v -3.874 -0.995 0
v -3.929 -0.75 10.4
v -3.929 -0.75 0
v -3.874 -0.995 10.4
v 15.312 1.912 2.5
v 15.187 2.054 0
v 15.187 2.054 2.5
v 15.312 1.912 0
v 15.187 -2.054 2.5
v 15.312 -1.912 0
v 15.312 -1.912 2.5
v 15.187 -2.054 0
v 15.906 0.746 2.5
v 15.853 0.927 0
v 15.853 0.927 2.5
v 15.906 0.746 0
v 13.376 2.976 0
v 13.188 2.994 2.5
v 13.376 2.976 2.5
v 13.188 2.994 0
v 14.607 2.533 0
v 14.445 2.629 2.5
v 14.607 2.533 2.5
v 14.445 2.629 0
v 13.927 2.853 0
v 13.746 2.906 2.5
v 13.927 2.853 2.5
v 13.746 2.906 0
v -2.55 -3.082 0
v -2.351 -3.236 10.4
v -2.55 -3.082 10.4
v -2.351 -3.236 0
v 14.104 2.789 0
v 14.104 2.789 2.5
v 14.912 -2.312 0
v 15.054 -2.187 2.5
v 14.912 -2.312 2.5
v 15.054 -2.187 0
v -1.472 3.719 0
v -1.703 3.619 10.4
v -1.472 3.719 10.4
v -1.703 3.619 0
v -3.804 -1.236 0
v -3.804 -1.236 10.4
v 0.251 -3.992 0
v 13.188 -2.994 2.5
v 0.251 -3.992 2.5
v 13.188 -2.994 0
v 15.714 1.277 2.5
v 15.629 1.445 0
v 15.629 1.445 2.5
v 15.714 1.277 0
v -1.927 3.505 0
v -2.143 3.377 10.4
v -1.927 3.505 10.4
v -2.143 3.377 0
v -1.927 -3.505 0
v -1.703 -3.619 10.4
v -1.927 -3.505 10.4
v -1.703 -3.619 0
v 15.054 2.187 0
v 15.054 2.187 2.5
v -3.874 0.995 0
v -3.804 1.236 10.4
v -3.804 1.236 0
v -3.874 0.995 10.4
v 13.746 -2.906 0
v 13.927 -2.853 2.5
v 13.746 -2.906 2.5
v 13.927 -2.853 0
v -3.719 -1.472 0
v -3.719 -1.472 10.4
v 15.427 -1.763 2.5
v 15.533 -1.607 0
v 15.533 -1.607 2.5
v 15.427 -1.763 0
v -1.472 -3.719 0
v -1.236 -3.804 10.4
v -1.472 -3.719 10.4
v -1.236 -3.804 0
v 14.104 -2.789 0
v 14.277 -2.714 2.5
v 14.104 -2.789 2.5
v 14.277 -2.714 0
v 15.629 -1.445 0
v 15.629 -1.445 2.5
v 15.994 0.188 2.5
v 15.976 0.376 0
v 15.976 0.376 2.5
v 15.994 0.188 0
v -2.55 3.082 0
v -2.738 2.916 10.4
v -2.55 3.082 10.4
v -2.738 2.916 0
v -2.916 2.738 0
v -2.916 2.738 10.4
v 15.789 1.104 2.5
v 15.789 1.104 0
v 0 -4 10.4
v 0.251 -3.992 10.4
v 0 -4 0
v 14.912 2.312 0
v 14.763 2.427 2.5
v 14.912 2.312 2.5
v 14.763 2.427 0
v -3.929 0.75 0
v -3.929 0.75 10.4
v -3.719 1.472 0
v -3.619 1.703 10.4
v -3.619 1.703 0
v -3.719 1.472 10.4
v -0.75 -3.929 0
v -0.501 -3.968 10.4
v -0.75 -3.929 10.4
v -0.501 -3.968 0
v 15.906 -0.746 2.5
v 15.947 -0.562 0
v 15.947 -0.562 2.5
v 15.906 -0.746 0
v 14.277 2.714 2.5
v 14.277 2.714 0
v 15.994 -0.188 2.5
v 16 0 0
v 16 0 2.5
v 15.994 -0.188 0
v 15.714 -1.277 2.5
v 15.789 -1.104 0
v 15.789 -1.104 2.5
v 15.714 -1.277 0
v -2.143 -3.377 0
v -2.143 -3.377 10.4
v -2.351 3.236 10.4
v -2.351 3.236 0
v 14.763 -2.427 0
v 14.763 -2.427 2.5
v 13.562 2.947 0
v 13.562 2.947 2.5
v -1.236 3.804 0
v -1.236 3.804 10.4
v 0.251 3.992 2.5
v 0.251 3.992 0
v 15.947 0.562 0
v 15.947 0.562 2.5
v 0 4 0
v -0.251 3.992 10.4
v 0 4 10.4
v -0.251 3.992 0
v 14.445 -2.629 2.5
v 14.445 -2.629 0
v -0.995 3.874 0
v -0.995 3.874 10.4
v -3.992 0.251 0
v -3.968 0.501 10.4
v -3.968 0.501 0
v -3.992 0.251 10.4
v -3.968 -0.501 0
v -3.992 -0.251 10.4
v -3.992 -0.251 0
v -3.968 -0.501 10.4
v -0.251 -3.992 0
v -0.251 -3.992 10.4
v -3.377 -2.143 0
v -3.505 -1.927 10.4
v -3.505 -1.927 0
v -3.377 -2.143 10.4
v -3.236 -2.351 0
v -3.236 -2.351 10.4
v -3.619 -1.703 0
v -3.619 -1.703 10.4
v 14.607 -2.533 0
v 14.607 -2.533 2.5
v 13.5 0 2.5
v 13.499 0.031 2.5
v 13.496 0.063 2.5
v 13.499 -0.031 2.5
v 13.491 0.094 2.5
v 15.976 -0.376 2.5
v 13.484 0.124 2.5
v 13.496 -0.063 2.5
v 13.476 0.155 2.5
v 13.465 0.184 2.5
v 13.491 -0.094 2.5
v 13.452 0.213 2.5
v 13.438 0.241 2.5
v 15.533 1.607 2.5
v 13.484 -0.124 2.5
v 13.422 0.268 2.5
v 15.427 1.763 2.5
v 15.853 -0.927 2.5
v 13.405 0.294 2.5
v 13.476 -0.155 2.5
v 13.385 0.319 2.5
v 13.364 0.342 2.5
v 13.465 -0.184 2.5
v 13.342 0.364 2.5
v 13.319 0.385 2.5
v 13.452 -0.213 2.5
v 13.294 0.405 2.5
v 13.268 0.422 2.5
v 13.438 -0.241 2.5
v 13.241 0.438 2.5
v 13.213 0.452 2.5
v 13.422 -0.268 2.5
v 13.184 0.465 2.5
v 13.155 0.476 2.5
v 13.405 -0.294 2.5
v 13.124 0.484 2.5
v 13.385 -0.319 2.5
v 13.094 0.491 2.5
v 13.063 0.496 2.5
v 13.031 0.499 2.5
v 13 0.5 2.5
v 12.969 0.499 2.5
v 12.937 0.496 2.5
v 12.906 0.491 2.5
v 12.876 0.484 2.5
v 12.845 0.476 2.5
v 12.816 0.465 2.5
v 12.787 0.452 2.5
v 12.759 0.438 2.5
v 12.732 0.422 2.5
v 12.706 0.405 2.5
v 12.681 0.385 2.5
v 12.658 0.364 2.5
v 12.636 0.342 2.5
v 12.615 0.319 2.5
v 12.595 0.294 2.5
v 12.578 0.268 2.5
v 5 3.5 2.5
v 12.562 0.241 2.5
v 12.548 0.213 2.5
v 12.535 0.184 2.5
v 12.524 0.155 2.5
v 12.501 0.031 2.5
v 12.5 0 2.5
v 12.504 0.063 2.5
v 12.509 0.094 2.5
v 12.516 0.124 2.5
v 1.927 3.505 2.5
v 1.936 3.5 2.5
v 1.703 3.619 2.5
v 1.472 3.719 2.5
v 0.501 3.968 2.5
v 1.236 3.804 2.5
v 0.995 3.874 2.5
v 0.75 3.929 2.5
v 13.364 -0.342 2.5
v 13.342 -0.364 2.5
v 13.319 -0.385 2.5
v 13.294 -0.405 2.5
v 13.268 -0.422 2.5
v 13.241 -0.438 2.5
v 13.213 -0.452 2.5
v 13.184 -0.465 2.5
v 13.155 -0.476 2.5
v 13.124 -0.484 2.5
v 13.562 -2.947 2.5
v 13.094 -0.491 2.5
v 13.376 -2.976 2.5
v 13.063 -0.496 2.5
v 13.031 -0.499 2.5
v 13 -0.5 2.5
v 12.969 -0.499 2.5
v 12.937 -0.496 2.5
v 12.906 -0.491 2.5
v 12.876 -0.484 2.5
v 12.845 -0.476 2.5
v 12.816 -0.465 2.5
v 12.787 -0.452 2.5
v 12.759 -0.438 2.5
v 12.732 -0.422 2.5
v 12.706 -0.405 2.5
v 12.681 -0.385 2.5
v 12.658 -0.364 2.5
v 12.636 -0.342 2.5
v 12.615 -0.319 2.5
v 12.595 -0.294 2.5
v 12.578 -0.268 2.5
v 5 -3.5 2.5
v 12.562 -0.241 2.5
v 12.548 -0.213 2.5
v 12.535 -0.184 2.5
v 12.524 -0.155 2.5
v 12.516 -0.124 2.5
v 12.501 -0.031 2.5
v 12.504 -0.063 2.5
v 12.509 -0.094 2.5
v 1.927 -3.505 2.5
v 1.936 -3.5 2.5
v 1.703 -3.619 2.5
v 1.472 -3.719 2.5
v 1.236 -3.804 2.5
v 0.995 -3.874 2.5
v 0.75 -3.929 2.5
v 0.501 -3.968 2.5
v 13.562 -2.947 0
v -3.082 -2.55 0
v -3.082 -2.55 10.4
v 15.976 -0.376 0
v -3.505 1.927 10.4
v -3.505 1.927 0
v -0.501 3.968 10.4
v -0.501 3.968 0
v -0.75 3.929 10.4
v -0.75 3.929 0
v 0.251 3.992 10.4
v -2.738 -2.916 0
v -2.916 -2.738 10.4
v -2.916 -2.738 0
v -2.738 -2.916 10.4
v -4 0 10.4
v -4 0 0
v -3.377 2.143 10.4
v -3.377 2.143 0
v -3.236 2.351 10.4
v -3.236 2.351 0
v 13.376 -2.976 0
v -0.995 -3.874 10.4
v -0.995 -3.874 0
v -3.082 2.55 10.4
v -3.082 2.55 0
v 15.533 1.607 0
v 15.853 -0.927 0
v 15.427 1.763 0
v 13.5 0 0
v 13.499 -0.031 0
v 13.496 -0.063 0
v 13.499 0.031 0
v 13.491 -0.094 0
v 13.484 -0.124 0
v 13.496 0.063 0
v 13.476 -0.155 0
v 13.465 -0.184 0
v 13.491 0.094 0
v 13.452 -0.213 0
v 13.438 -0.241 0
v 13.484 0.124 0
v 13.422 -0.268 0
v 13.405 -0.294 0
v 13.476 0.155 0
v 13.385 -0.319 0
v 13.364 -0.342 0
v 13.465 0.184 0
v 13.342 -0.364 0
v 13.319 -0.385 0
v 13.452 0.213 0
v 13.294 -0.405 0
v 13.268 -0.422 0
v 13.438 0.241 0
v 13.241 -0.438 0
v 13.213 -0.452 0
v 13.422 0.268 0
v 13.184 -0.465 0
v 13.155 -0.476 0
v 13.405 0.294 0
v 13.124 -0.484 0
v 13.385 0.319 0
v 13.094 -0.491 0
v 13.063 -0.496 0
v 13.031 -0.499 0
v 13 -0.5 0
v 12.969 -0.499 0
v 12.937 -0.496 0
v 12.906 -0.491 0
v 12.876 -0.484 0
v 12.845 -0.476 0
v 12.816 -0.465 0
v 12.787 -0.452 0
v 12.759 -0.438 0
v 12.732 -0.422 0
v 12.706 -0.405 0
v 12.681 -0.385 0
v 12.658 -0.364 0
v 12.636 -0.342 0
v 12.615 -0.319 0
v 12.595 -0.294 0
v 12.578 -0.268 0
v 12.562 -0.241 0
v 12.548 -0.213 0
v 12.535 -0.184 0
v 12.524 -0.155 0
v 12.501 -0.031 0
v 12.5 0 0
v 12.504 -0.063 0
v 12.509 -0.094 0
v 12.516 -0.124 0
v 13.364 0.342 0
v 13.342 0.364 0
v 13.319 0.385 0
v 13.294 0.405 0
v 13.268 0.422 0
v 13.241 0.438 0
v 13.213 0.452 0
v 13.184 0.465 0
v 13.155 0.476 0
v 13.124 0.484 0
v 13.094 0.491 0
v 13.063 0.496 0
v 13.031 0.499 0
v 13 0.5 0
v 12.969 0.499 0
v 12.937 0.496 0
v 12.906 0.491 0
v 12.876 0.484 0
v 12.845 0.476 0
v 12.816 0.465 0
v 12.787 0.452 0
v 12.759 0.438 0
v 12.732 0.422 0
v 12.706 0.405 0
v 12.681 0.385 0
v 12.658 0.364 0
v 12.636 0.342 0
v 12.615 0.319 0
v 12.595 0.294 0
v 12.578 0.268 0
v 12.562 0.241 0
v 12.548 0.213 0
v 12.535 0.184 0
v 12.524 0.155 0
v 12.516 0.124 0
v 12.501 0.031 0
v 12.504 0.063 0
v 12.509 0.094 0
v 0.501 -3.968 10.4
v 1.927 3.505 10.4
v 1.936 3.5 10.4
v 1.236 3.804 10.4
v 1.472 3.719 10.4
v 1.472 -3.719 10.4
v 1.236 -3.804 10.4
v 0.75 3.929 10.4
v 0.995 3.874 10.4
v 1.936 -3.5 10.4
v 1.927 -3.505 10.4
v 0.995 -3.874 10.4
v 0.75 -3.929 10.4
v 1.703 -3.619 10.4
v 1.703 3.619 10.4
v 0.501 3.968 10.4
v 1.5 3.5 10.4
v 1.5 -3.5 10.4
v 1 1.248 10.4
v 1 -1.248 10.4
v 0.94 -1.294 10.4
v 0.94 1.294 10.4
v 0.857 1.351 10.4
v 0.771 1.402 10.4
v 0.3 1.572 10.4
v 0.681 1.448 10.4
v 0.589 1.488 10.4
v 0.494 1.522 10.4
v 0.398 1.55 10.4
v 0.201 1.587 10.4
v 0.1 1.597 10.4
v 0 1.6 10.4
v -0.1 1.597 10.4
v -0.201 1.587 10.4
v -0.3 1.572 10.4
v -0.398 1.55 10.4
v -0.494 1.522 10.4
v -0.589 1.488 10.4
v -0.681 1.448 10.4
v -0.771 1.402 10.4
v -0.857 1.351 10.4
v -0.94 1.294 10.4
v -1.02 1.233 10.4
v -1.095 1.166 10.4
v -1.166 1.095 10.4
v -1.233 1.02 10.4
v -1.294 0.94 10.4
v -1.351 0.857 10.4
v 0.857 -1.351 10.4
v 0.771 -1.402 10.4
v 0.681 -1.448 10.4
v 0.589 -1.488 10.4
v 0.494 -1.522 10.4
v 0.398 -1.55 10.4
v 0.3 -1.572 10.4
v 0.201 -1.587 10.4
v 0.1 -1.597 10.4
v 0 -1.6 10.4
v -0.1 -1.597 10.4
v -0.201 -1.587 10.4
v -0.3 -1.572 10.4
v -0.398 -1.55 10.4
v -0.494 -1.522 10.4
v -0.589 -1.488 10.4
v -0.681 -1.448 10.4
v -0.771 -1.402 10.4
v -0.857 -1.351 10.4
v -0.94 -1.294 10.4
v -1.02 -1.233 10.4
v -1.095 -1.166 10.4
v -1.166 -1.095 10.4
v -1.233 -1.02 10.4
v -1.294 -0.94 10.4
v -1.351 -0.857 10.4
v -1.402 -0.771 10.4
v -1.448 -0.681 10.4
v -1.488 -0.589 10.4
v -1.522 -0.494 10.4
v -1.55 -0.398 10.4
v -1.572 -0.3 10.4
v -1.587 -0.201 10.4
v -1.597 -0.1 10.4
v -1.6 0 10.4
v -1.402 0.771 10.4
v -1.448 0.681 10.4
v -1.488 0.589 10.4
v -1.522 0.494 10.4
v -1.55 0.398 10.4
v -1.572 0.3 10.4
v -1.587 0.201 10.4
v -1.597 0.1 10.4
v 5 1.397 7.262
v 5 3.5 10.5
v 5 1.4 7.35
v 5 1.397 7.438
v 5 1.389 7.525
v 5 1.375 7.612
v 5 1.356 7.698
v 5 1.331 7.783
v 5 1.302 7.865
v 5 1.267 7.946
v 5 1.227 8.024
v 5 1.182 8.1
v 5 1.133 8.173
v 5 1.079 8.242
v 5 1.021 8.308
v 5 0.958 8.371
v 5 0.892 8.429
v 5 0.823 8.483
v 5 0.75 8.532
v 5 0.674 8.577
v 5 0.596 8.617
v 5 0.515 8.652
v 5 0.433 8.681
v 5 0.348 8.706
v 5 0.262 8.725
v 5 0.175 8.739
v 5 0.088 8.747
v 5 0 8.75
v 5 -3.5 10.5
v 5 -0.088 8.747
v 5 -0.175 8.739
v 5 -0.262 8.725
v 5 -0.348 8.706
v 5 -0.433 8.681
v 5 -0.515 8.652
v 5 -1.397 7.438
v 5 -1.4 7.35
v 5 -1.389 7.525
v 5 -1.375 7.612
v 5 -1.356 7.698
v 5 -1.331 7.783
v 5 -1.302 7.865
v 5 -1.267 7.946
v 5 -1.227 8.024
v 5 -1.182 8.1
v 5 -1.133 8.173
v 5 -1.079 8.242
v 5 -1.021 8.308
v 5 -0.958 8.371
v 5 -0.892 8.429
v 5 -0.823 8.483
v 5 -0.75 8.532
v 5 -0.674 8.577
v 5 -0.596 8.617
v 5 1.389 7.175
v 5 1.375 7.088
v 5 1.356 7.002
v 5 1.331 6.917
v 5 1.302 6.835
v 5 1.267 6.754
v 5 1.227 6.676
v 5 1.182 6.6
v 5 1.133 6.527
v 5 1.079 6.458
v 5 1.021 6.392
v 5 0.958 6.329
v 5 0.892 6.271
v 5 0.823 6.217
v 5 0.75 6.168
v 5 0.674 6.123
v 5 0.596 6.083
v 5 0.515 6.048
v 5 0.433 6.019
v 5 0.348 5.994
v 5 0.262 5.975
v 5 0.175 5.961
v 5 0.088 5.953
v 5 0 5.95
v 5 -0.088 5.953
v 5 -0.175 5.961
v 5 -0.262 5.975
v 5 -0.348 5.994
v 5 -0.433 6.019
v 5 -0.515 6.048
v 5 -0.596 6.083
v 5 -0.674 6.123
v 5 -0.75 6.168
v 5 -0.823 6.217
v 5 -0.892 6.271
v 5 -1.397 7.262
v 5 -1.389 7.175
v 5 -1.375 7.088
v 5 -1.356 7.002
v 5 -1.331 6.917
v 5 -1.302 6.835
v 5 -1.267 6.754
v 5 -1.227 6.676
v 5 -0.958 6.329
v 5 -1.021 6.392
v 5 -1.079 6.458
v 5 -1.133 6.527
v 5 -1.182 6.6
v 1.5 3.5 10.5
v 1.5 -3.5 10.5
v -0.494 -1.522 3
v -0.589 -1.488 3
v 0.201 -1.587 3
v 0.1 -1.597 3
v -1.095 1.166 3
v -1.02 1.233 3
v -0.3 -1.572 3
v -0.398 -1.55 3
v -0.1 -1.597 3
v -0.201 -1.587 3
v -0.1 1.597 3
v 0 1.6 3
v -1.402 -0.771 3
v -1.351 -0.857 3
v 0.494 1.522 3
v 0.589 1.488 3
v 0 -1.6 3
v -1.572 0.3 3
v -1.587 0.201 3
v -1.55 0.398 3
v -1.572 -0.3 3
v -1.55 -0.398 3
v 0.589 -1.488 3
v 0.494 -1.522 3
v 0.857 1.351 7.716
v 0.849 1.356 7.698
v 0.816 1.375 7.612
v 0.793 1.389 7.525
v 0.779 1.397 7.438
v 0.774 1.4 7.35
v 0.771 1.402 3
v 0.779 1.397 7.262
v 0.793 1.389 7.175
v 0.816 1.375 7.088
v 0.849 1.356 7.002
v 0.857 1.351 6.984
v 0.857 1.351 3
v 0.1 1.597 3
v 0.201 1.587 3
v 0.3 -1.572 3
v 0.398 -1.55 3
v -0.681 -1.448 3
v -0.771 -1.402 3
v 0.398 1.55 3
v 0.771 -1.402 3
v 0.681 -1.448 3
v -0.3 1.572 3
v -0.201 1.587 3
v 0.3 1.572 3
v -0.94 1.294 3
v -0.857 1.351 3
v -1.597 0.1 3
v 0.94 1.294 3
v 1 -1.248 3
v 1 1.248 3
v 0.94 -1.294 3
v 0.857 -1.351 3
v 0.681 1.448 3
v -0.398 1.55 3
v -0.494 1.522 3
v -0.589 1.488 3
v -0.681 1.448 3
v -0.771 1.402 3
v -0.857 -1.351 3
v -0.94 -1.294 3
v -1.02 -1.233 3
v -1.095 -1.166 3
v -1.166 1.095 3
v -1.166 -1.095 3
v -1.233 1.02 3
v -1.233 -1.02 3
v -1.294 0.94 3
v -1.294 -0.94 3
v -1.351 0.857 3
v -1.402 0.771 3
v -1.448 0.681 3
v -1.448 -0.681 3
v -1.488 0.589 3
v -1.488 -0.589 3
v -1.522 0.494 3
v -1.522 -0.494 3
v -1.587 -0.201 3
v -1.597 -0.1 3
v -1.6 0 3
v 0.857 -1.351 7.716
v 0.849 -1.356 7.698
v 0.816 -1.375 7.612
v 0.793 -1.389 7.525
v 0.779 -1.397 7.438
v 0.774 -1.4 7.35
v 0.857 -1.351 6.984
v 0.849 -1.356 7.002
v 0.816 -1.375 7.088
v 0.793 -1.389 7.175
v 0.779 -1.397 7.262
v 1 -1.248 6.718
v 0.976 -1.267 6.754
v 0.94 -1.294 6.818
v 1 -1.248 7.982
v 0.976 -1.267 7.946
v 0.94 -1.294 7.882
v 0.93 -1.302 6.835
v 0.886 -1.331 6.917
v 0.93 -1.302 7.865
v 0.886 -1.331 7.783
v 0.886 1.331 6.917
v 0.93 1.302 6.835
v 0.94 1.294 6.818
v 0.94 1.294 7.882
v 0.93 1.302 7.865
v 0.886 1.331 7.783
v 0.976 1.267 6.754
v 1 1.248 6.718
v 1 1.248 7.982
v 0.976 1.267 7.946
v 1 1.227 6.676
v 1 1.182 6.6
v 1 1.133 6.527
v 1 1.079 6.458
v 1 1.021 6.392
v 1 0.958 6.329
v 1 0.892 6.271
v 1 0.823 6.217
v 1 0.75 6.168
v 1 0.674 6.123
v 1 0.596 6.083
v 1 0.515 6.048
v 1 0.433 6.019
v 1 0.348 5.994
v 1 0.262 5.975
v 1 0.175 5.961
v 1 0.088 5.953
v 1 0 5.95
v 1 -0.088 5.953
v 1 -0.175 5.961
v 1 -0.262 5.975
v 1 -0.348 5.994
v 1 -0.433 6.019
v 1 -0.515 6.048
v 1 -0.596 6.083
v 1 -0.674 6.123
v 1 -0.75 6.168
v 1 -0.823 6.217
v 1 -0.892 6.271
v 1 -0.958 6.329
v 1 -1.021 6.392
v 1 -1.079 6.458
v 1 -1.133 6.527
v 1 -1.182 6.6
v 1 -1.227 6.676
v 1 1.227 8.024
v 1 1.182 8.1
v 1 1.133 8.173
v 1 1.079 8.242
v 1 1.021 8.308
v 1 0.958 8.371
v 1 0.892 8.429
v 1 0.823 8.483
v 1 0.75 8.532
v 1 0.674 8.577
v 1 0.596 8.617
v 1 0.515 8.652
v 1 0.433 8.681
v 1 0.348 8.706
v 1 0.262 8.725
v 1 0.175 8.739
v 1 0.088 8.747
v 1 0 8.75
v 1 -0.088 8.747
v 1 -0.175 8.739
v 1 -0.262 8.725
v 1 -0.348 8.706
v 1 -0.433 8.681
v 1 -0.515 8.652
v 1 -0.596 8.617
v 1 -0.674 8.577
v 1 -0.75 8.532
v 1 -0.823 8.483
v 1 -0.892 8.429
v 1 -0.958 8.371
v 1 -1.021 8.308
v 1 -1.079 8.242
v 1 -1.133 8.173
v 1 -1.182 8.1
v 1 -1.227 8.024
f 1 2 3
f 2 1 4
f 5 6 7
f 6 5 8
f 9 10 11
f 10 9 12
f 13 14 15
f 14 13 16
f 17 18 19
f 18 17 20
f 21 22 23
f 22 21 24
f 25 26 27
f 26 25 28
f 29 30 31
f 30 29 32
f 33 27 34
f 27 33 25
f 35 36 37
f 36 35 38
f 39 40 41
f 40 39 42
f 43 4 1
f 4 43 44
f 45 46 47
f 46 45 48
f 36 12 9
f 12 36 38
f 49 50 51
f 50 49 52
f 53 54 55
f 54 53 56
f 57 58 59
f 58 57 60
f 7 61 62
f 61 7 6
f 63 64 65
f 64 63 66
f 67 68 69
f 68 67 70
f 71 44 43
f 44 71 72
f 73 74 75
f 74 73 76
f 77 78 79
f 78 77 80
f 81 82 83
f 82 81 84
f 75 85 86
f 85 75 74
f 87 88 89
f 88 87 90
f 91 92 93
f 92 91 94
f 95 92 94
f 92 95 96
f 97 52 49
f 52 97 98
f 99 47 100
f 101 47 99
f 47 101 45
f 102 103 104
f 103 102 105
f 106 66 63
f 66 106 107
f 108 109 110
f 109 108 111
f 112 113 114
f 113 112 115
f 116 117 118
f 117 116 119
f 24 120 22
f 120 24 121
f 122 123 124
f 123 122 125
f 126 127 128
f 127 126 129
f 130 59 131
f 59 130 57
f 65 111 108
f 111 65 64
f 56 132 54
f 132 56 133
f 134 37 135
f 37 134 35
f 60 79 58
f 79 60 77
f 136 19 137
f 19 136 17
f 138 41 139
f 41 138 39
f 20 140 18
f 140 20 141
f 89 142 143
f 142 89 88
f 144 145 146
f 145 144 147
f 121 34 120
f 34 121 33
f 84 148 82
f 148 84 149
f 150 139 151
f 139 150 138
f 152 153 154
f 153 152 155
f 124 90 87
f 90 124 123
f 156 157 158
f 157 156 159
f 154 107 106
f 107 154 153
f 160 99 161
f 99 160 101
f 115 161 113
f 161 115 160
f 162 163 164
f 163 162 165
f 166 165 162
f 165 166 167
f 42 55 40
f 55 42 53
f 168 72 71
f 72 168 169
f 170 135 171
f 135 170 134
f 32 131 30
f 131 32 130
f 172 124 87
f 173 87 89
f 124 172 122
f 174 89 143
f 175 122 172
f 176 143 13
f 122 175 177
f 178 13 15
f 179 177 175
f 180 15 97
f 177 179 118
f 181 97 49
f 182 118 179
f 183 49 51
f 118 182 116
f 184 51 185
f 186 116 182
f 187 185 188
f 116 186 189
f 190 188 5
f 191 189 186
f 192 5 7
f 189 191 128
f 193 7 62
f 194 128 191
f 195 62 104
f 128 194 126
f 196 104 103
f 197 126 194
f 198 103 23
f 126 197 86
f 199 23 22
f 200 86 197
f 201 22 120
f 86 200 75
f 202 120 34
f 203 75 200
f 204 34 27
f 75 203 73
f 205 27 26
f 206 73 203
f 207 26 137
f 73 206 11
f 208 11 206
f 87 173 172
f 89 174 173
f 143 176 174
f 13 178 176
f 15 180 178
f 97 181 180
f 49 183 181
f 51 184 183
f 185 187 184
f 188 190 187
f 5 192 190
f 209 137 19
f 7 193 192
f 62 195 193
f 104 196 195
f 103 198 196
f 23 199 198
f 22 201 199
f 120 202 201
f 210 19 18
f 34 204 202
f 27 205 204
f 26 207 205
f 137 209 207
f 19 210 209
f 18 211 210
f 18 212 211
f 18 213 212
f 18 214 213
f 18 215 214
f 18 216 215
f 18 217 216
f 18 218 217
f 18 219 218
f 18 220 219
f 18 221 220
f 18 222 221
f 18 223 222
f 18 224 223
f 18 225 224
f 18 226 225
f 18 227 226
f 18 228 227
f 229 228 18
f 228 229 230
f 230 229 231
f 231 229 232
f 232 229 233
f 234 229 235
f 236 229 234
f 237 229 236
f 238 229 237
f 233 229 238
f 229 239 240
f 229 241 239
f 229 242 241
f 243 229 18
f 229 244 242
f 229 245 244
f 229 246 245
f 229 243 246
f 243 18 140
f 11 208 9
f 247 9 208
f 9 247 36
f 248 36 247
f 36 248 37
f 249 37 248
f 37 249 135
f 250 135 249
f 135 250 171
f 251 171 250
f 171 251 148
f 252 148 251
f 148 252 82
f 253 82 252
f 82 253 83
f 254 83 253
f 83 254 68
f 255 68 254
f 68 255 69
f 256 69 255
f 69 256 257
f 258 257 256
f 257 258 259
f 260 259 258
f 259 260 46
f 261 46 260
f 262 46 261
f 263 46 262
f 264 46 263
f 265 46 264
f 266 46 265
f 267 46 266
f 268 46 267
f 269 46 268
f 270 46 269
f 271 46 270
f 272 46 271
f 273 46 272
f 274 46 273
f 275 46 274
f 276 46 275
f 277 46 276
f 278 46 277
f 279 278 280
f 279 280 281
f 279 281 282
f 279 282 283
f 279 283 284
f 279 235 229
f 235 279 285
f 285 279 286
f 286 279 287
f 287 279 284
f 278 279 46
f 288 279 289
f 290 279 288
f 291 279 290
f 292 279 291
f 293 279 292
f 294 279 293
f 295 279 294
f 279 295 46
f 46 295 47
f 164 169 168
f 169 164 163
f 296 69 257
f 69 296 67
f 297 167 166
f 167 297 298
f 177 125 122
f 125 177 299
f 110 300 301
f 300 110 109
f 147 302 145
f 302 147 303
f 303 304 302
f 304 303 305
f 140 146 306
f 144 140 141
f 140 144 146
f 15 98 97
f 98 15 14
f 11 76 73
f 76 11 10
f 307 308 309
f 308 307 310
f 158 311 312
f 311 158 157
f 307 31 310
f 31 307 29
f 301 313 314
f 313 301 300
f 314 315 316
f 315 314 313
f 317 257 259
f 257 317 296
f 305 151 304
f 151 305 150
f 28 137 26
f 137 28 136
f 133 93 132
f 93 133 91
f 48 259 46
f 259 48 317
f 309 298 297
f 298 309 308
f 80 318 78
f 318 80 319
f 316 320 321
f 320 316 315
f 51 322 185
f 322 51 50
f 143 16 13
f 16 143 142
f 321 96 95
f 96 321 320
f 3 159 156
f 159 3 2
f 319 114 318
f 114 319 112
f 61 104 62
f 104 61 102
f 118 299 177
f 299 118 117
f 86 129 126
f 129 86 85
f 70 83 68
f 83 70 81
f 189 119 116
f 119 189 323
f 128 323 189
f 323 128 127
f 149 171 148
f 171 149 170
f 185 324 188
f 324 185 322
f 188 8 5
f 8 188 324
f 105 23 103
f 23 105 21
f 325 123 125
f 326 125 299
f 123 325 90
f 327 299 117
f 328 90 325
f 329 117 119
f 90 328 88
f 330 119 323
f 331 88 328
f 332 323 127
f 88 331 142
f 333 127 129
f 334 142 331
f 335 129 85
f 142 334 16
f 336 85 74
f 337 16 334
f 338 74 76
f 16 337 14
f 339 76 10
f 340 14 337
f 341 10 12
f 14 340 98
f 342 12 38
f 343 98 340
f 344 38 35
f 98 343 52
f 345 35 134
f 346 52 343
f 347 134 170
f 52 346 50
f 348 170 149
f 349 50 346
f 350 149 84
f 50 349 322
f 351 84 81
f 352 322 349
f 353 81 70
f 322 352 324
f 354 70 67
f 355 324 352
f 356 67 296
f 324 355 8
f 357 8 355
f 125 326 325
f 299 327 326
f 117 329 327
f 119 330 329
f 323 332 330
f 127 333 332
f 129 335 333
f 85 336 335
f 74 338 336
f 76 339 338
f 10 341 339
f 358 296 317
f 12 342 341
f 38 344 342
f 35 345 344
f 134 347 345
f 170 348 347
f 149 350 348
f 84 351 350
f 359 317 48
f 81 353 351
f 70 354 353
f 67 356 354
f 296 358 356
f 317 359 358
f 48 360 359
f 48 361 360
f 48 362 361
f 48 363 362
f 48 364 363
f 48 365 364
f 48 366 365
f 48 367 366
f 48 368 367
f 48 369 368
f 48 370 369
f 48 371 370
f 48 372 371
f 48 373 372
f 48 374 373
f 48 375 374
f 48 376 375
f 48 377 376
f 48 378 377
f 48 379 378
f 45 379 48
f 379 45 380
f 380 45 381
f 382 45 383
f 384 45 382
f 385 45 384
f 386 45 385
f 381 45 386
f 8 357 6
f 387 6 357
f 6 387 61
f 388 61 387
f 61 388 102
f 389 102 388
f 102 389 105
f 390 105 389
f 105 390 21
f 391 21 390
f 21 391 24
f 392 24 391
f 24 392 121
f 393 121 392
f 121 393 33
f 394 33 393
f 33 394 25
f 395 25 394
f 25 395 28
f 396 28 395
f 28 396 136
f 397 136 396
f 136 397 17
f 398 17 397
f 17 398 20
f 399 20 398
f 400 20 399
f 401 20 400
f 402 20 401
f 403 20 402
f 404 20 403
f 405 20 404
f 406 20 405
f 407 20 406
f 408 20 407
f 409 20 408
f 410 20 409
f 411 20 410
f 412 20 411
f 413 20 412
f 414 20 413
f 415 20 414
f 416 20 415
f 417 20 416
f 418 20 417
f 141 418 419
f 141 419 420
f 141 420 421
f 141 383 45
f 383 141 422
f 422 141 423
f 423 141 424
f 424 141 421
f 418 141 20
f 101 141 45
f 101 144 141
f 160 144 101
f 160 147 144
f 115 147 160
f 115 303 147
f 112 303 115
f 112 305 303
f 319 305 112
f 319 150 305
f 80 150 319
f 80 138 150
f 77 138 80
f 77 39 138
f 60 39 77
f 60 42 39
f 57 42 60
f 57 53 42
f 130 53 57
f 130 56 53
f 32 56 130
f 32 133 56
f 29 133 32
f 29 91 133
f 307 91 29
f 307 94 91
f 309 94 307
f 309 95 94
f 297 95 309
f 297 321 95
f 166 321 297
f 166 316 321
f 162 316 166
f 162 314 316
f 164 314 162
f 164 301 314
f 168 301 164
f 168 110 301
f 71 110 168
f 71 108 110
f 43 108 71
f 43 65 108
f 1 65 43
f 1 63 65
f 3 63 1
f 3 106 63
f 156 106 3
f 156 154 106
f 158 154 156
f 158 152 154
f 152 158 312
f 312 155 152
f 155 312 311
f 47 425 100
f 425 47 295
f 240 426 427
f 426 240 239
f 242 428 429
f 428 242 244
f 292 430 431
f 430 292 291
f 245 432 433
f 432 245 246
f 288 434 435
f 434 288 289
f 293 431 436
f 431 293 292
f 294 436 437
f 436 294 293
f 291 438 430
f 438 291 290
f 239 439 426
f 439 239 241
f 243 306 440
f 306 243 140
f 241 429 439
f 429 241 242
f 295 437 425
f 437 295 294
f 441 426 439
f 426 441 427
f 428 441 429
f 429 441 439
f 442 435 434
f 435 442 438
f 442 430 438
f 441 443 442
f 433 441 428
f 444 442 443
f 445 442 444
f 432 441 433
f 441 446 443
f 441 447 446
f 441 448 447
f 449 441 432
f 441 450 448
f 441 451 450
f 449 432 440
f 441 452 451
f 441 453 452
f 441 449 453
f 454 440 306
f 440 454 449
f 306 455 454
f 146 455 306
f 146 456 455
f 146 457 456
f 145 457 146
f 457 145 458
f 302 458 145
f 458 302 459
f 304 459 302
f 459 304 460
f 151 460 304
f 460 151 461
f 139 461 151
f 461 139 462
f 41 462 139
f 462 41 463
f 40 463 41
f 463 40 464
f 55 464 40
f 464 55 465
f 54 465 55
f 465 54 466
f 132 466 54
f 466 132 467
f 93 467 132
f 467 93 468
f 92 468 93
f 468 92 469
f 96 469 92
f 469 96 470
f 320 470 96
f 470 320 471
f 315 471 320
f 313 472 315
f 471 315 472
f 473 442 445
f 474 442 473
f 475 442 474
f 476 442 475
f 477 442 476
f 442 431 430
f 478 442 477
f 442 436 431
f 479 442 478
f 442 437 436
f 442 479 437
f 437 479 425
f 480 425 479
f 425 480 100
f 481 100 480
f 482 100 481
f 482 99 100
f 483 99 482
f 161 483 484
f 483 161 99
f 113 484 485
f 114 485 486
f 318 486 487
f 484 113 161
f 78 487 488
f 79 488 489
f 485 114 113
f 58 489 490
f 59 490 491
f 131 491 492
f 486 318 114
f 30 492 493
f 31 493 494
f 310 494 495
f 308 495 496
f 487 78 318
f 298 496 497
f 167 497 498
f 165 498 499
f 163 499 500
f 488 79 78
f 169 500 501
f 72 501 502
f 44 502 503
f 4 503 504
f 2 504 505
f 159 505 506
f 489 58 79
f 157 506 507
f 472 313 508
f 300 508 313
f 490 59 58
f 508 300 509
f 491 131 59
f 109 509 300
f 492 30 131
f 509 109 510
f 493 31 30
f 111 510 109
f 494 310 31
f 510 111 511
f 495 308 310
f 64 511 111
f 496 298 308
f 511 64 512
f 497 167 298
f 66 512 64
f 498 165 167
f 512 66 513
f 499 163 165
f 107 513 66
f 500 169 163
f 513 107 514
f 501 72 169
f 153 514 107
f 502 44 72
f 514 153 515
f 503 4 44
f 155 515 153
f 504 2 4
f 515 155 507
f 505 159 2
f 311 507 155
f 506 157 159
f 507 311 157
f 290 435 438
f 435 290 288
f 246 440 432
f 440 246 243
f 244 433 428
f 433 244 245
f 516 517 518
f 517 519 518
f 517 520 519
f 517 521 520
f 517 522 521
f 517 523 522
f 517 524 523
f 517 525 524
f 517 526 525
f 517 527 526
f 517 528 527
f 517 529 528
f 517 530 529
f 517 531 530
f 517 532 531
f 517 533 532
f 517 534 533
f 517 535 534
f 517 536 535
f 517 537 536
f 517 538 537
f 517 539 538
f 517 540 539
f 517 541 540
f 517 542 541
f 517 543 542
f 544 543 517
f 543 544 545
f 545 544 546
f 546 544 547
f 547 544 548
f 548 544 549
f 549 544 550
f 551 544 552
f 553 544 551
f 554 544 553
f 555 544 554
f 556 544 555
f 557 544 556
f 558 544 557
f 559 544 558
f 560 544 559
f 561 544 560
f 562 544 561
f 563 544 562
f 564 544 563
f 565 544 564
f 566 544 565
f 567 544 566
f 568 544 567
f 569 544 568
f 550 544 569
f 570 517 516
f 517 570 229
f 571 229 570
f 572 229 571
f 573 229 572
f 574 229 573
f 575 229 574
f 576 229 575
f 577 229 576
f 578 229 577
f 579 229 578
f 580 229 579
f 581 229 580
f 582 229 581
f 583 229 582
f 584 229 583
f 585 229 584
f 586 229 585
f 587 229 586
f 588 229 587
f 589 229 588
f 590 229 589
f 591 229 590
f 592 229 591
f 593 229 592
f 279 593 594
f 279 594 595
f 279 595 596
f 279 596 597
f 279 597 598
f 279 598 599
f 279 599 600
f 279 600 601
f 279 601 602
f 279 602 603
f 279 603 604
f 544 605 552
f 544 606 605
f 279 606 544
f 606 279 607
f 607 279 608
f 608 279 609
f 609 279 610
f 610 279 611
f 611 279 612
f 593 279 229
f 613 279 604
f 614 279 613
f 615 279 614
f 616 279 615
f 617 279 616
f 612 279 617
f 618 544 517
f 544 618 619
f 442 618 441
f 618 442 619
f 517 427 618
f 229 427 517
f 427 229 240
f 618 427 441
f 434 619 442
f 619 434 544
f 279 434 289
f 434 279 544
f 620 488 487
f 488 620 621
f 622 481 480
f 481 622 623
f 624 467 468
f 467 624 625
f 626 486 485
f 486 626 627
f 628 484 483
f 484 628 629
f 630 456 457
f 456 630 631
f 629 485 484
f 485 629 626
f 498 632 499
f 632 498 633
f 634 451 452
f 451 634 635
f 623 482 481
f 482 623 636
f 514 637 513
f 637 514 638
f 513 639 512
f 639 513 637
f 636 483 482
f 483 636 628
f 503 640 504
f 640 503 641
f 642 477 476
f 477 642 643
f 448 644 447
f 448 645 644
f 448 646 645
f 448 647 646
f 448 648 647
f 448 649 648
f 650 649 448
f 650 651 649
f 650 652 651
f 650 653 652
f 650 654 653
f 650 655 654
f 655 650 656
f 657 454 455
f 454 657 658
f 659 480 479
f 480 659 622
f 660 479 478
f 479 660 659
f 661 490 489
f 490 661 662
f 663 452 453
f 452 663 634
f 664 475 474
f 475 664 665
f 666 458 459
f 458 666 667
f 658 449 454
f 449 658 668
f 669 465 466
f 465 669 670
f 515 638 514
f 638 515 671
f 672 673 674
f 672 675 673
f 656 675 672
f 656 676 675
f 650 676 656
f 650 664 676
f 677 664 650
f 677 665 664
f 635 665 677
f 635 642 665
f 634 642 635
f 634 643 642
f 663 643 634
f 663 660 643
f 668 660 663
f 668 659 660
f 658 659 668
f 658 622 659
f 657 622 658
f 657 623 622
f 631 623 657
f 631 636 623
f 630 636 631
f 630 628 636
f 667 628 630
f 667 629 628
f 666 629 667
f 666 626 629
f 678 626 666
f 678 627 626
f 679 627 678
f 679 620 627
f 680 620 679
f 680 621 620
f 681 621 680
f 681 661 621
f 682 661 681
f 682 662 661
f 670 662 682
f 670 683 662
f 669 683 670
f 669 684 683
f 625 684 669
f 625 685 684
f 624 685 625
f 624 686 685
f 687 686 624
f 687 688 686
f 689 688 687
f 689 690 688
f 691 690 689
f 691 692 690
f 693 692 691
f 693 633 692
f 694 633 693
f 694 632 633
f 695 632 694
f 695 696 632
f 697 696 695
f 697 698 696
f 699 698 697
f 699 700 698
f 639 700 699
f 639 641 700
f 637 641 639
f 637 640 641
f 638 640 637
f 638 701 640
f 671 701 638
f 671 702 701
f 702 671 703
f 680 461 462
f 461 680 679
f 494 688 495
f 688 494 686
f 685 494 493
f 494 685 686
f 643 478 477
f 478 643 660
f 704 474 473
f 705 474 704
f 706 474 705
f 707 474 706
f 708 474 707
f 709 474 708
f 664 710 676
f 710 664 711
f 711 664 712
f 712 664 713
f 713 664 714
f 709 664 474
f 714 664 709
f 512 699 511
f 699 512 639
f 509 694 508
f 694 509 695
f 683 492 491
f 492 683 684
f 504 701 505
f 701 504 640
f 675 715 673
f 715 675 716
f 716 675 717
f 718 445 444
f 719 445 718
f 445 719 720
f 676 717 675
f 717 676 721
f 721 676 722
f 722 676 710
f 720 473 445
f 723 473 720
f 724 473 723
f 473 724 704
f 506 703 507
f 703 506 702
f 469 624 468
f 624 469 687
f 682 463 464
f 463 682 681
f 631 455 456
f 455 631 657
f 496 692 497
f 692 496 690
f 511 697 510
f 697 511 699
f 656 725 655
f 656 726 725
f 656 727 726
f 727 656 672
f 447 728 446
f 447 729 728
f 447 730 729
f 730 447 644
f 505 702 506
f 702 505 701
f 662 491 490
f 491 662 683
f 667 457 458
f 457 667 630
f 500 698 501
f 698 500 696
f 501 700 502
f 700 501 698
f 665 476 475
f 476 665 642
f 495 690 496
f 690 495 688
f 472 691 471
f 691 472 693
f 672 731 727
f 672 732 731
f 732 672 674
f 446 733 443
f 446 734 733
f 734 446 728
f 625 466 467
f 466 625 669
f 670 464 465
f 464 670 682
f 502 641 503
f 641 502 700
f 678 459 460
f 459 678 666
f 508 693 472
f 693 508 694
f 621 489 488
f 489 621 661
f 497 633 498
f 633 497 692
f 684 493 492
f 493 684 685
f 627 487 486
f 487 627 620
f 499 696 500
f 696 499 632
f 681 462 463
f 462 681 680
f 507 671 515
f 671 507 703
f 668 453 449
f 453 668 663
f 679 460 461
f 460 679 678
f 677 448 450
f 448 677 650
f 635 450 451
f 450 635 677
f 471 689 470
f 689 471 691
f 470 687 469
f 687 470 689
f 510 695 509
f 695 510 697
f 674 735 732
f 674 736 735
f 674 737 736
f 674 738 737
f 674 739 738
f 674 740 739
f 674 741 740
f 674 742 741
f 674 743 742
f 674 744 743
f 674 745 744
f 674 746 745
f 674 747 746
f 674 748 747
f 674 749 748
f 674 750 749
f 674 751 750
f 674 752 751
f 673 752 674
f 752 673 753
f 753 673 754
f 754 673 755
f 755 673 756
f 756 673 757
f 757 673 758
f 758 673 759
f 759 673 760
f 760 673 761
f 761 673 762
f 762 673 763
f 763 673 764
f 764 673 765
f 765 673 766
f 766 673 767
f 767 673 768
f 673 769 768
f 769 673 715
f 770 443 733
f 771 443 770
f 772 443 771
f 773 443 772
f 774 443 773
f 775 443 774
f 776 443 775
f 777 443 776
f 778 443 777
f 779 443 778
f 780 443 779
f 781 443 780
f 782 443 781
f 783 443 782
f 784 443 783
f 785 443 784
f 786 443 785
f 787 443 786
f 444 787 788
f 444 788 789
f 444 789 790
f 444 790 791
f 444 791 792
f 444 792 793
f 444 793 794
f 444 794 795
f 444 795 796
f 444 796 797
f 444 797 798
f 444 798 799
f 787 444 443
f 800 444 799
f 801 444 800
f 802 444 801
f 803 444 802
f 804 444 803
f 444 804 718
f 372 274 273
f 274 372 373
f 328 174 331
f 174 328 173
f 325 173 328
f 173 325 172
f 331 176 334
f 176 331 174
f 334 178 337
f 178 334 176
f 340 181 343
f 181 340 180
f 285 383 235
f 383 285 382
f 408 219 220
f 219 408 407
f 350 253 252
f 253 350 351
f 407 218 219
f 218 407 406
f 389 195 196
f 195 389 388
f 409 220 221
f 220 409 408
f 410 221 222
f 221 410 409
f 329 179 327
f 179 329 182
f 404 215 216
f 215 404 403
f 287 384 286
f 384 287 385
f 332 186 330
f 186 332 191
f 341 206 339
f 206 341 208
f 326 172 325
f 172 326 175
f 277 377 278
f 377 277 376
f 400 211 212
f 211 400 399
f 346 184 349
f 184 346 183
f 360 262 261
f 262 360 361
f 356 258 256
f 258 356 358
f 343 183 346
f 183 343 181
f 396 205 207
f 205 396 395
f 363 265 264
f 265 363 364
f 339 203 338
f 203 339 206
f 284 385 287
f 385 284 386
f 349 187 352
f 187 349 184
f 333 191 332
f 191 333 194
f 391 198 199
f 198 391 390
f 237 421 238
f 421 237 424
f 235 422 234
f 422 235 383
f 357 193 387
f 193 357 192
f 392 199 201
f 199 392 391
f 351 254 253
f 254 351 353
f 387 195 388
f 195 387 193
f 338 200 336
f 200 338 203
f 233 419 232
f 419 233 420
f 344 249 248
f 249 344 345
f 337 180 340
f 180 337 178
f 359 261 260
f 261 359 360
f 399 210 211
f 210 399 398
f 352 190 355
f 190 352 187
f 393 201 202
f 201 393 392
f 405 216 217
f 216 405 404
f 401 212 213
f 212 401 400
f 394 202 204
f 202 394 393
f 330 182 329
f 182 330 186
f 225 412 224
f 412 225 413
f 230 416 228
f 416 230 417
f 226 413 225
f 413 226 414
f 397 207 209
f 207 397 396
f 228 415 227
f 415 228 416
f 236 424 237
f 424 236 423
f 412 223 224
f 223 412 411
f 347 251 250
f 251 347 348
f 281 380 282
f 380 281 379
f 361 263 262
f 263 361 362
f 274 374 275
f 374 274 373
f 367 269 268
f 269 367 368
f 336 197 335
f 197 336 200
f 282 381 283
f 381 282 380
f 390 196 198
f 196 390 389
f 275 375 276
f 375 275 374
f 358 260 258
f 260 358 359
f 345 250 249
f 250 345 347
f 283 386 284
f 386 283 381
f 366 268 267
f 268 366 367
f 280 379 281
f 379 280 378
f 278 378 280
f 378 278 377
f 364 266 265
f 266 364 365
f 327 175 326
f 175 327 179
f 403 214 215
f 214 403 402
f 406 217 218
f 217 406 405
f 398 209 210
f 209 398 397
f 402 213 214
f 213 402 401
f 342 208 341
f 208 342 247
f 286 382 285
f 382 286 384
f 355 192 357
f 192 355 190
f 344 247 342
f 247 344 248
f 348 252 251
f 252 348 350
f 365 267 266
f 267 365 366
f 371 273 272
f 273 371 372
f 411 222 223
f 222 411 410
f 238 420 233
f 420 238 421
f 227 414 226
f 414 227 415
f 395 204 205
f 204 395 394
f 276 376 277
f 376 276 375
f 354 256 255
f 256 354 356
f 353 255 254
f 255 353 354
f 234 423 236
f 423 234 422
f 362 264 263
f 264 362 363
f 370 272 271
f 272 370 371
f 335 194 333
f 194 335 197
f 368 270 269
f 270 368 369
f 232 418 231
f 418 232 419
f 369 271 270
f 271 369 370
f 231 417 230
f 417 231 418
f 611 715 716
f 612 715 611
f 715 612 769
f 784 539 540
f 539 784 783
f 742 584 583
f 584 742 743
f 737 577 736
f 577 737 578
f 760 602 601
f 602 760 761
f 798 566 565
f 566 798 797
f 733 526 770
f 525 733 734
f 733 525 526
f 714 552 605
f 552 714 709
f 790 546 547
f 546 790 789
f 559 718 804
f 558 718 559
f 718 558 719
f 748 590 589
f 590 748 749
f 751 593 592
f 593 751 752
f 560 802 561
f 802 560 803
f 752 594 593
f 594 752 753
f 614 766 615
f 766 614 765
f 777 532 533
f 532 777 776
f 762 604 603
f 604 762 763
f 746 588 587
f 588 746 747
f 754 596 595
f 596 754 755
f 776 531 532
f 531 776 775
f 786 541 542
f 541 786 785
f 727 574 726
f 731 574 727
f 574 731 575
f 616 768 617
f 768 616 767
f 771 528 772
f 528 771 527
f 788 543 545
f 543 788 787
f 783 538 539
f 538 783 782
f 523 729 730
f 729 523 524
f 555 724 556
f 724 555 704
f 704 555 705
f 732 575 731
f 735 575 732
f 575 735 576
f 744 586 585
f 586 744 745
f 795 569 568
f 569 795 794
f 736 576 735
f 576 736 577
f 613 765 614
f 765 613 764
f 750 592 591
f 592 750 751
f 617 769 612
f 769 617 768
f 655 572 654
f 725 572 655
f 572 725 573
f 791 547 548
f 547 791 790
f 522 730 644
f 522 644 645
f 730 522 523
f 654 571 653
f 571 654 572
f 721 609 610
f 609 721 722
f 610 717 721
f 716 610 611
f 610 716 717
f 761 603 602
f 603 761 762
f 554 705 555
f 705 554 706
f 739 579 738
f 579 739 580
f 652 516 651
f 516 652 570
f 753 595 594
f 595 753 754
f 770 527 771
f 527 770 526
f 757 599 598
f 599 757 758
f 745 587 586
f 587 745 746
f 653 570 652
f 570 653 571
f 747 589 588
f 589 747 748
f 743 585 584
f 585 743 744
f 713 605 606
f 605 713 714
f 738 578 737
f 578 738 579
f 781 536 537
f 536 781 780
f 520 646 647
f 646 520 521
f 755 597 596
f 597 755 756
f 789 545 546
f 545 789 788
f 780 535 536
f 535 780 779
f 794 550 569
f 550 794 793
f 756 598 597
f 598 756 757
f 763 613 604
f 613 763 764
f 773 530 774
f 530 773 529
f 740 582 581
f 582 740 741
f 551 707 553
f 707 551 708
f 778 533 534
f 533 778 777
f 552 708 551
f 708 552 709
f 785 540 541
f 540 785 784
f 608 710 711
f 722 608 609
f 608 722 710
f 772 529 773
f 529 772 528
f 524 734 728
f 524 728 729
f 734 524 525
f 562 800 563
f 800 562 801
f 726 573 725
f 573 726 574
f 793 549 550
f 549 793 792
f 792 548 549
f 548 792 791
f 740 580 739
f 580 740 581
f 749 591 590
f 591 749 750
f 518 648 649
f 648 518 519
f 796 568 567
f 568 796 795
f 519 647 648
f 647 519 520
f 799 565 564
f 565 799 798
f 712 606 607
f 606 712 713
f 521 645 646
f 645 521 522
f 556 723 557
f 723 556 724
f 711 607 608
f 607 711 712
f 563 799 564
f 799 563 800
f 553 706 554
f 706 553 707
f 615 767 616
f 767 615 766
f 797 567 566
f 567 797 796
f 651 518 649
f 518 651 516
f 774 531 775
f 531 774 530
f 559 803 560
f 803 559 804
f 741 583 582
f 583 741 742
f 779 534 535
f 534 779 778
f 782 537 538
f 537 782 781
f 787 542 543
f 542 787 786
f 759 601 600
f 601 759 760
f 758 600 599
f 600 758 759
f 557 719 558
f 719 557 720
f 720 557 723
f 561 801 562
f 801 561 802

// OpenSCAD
$fn = $preview ? 100 : 100; // Разрешение модели

module move(x=0,y=0,z=0,rx=0,ry=0,rz=0) // Модуль перемещения
{translate([x,y,z]) rotate([rx,ry,rz]) children();}






difference(){
  union() {
*tube();
*reductor();
*kreplRed();
*move(rx=90) krepl_tube();
move(rx=0) nasadka();
*move(z=reductor_H+moto_H+h_bort+5, rx=180) krishka();

  }
  *move(x=-60, z=-10) cube(120);
}

filament=0.2;
// Параметры моторчика
reductor_W=10;
reductor_L=12;
reductor_H=9;
reductor_d1=4;
reductor_d1h=1.5;
moto_H=15; // высота движка до площадки с выводами

module reductor() {
move(x=-(reductor_L)/2, y=-(reductor_W)/2) cube([reductor_L+filament*1, reductor_W+filament*1, reductor_H+moto_H]);
move(z=-10) cylinder(h = 10, d = reductor_d1+filament);
}



module tube(){
  difference() {
cylinder(h = 100, d = 50);
move(z=-5) cylinder(h = 110, d = 47);
  }
}


module kreplRed() {
  difference() {

union() {
   cylinder(h = reductor_H+moto_H+h_bort, d = 22);
move(z=-5) cylinder(h=20, d1=30, d2=22);
// move(z=0) minkowski() {
//    cube([40,10,6], center=true);
//    cylinder(r=2,h=1);
// }
move(x=10, z=16) cylinder(h = 8.6, d = 8);
move(x=10, z=16-8.6) cylinder(h = 8.6, d1 = 3, d2 = 8);
move(x=-10, z=16) cylinder(h = 8.6, d = 8);
move(x=-10, z=16-8.6) cylinder(h = 8.6, d1 = 3, d2 = 8);
move(y=10, z=-55/2, rx=90) cylinder(h=20, d=55+15);
move(x=(55+15)/2, z=-55/2+0.5) cylinder(h = 6, d = 8);
move(x=-(55+15)/2, z=-55/2+0.5) cylinder(h = 6, d = 8);
}


//#move(x=17) cube([3,6,15], center=true);
//#move(x=-17) cube([3,6,15], center=true);
move(x=10, z=15) cylinder(h = 10, d = 2.7);
move(x=-10, z=15) cylinder(h = 10, d = 2.7);
move(z=h_bort, rz=90) reductor();
move(y=25, z=-55/2, rx=90) cylinder(h=50, d=55);
//#move(z=-6) cube([50,20,6], center=true);
move(z=-20-55/2+0.5) cube([80,30,40], center=true);
move(x=(55+15)/2, z=-55/2+0.5) cylinder(h = 10, d = 3);
move(x=(55+15)/2, z=-55/2+0.5+6) cylinder(h = 10, d = 8);
move(x=-(55+15)/2, z=-55/2+0.5) cylinder(h = 10, d = 3);
move(x=-(55+15)/2, z=-55/2+0.5+6) cylinder(h = 10, d = 8);
  }
}


module krepl_tube() {
  difference() {
union() {
move(y=10, z=-55/2, rx=90) cylinder(h=20, d=55+15);
move(x=(55+15)/2, z=-6-55/2-0.5) cylinder(h = 6, d = 8);
move(x=-(55+15)/2, z=-6-55/2-0.5) cylinder(h = 6, d = 8);
}
move(y=25, z=-55/2, rx=90) cylinder(h=50, d=55);
move(z=20-55/2-0.5) cube([80,30,40], center=true);
move(x=(55+15)/2, z=-55/2+0.5-10) cylinder(h = 10, d = 3);
move(x=(55+15)/2, z=-55/2-0.5-6-10) cylinder(h = 10, d = 8);
move(x=-(55+15)/2, z=-55/2+0.5-10) cylinder(h = 10, d = 3);
move(x=-(55+15)/2, z=-55/2-0.5-6-10) cylinder(h = 10, d = 8);
  }
  
}





// Параметры вала двигателя
d_vala=3; //Диаметр вала
l_srez=2.5; // растояние от грани среза до противоположной точки на оси
h_bort=0.6;
l_vala=10-h_bort-4; // Полная днина вала


module nasadka() {
  difference() {
union() {    
hull(){
cylinder(h = 2.5, d = 8);
move(x=13) cylinder(h = 2.5, d = 6);
}

cylinder(h = l_vala+4+1, d = 8);
*move(z=l_vala+4) cylinder(h = 1, d1 = 8, d2 = d_vala+filament);
move(x=1.5,y=-7/2, z=2.5) cube([3.5,7,8]);




}

*move(z=-0.6) difference() {
 move(z=5+9) cube(size = 10, center=true);
move(z=9) cylinder(h = 2, d1=11, d2=3);
}


move(x=13, z=-1) cylinder(h = 10, d = 1);
  move(z=3, rz=-90) difference() {
  cylinder(h = l_vala+2, d = d_vala+filament);
  move(x=-3, y=d_vala/2-(d_vala-l_srez)) cube([6,6,15]);
  }
move(z=2.2/2+2.5+5.5/2+1, ry=90) cylinder(h = 6, d = 2.8);
}
}






module krishka() {
  h0=15;
  h1=8;
  h2=15-8;
  difference() {
  union() {
    cylinder(h = h0, d = 22);
    move(x=10) cylinder(h = h1, d = 8);
    move(x=-10) cylinder(h = h1, d = 8);
  }
move(x=10) cylinder(h = 10, d = 3.1);
move(x=-10) cylinder(h = 10, d = 3.1);
move(x=10, z=h1) cylinder(h = h2*2, d = 8);
move(x=-10, z=h1) cylinder(h = h2*2, d = 8);
move(z=6) cube([6,12,12], center=true);
move(x=0, z=12-1, rx=90) cylinder(h = 20, d = 2);
move(x=10.3, y=-10, z=8, ry=-32) cube(size = 20);
move(x=-10.3, y=-10, z=8, ry=-58) cube(size = 20);
  }
}
